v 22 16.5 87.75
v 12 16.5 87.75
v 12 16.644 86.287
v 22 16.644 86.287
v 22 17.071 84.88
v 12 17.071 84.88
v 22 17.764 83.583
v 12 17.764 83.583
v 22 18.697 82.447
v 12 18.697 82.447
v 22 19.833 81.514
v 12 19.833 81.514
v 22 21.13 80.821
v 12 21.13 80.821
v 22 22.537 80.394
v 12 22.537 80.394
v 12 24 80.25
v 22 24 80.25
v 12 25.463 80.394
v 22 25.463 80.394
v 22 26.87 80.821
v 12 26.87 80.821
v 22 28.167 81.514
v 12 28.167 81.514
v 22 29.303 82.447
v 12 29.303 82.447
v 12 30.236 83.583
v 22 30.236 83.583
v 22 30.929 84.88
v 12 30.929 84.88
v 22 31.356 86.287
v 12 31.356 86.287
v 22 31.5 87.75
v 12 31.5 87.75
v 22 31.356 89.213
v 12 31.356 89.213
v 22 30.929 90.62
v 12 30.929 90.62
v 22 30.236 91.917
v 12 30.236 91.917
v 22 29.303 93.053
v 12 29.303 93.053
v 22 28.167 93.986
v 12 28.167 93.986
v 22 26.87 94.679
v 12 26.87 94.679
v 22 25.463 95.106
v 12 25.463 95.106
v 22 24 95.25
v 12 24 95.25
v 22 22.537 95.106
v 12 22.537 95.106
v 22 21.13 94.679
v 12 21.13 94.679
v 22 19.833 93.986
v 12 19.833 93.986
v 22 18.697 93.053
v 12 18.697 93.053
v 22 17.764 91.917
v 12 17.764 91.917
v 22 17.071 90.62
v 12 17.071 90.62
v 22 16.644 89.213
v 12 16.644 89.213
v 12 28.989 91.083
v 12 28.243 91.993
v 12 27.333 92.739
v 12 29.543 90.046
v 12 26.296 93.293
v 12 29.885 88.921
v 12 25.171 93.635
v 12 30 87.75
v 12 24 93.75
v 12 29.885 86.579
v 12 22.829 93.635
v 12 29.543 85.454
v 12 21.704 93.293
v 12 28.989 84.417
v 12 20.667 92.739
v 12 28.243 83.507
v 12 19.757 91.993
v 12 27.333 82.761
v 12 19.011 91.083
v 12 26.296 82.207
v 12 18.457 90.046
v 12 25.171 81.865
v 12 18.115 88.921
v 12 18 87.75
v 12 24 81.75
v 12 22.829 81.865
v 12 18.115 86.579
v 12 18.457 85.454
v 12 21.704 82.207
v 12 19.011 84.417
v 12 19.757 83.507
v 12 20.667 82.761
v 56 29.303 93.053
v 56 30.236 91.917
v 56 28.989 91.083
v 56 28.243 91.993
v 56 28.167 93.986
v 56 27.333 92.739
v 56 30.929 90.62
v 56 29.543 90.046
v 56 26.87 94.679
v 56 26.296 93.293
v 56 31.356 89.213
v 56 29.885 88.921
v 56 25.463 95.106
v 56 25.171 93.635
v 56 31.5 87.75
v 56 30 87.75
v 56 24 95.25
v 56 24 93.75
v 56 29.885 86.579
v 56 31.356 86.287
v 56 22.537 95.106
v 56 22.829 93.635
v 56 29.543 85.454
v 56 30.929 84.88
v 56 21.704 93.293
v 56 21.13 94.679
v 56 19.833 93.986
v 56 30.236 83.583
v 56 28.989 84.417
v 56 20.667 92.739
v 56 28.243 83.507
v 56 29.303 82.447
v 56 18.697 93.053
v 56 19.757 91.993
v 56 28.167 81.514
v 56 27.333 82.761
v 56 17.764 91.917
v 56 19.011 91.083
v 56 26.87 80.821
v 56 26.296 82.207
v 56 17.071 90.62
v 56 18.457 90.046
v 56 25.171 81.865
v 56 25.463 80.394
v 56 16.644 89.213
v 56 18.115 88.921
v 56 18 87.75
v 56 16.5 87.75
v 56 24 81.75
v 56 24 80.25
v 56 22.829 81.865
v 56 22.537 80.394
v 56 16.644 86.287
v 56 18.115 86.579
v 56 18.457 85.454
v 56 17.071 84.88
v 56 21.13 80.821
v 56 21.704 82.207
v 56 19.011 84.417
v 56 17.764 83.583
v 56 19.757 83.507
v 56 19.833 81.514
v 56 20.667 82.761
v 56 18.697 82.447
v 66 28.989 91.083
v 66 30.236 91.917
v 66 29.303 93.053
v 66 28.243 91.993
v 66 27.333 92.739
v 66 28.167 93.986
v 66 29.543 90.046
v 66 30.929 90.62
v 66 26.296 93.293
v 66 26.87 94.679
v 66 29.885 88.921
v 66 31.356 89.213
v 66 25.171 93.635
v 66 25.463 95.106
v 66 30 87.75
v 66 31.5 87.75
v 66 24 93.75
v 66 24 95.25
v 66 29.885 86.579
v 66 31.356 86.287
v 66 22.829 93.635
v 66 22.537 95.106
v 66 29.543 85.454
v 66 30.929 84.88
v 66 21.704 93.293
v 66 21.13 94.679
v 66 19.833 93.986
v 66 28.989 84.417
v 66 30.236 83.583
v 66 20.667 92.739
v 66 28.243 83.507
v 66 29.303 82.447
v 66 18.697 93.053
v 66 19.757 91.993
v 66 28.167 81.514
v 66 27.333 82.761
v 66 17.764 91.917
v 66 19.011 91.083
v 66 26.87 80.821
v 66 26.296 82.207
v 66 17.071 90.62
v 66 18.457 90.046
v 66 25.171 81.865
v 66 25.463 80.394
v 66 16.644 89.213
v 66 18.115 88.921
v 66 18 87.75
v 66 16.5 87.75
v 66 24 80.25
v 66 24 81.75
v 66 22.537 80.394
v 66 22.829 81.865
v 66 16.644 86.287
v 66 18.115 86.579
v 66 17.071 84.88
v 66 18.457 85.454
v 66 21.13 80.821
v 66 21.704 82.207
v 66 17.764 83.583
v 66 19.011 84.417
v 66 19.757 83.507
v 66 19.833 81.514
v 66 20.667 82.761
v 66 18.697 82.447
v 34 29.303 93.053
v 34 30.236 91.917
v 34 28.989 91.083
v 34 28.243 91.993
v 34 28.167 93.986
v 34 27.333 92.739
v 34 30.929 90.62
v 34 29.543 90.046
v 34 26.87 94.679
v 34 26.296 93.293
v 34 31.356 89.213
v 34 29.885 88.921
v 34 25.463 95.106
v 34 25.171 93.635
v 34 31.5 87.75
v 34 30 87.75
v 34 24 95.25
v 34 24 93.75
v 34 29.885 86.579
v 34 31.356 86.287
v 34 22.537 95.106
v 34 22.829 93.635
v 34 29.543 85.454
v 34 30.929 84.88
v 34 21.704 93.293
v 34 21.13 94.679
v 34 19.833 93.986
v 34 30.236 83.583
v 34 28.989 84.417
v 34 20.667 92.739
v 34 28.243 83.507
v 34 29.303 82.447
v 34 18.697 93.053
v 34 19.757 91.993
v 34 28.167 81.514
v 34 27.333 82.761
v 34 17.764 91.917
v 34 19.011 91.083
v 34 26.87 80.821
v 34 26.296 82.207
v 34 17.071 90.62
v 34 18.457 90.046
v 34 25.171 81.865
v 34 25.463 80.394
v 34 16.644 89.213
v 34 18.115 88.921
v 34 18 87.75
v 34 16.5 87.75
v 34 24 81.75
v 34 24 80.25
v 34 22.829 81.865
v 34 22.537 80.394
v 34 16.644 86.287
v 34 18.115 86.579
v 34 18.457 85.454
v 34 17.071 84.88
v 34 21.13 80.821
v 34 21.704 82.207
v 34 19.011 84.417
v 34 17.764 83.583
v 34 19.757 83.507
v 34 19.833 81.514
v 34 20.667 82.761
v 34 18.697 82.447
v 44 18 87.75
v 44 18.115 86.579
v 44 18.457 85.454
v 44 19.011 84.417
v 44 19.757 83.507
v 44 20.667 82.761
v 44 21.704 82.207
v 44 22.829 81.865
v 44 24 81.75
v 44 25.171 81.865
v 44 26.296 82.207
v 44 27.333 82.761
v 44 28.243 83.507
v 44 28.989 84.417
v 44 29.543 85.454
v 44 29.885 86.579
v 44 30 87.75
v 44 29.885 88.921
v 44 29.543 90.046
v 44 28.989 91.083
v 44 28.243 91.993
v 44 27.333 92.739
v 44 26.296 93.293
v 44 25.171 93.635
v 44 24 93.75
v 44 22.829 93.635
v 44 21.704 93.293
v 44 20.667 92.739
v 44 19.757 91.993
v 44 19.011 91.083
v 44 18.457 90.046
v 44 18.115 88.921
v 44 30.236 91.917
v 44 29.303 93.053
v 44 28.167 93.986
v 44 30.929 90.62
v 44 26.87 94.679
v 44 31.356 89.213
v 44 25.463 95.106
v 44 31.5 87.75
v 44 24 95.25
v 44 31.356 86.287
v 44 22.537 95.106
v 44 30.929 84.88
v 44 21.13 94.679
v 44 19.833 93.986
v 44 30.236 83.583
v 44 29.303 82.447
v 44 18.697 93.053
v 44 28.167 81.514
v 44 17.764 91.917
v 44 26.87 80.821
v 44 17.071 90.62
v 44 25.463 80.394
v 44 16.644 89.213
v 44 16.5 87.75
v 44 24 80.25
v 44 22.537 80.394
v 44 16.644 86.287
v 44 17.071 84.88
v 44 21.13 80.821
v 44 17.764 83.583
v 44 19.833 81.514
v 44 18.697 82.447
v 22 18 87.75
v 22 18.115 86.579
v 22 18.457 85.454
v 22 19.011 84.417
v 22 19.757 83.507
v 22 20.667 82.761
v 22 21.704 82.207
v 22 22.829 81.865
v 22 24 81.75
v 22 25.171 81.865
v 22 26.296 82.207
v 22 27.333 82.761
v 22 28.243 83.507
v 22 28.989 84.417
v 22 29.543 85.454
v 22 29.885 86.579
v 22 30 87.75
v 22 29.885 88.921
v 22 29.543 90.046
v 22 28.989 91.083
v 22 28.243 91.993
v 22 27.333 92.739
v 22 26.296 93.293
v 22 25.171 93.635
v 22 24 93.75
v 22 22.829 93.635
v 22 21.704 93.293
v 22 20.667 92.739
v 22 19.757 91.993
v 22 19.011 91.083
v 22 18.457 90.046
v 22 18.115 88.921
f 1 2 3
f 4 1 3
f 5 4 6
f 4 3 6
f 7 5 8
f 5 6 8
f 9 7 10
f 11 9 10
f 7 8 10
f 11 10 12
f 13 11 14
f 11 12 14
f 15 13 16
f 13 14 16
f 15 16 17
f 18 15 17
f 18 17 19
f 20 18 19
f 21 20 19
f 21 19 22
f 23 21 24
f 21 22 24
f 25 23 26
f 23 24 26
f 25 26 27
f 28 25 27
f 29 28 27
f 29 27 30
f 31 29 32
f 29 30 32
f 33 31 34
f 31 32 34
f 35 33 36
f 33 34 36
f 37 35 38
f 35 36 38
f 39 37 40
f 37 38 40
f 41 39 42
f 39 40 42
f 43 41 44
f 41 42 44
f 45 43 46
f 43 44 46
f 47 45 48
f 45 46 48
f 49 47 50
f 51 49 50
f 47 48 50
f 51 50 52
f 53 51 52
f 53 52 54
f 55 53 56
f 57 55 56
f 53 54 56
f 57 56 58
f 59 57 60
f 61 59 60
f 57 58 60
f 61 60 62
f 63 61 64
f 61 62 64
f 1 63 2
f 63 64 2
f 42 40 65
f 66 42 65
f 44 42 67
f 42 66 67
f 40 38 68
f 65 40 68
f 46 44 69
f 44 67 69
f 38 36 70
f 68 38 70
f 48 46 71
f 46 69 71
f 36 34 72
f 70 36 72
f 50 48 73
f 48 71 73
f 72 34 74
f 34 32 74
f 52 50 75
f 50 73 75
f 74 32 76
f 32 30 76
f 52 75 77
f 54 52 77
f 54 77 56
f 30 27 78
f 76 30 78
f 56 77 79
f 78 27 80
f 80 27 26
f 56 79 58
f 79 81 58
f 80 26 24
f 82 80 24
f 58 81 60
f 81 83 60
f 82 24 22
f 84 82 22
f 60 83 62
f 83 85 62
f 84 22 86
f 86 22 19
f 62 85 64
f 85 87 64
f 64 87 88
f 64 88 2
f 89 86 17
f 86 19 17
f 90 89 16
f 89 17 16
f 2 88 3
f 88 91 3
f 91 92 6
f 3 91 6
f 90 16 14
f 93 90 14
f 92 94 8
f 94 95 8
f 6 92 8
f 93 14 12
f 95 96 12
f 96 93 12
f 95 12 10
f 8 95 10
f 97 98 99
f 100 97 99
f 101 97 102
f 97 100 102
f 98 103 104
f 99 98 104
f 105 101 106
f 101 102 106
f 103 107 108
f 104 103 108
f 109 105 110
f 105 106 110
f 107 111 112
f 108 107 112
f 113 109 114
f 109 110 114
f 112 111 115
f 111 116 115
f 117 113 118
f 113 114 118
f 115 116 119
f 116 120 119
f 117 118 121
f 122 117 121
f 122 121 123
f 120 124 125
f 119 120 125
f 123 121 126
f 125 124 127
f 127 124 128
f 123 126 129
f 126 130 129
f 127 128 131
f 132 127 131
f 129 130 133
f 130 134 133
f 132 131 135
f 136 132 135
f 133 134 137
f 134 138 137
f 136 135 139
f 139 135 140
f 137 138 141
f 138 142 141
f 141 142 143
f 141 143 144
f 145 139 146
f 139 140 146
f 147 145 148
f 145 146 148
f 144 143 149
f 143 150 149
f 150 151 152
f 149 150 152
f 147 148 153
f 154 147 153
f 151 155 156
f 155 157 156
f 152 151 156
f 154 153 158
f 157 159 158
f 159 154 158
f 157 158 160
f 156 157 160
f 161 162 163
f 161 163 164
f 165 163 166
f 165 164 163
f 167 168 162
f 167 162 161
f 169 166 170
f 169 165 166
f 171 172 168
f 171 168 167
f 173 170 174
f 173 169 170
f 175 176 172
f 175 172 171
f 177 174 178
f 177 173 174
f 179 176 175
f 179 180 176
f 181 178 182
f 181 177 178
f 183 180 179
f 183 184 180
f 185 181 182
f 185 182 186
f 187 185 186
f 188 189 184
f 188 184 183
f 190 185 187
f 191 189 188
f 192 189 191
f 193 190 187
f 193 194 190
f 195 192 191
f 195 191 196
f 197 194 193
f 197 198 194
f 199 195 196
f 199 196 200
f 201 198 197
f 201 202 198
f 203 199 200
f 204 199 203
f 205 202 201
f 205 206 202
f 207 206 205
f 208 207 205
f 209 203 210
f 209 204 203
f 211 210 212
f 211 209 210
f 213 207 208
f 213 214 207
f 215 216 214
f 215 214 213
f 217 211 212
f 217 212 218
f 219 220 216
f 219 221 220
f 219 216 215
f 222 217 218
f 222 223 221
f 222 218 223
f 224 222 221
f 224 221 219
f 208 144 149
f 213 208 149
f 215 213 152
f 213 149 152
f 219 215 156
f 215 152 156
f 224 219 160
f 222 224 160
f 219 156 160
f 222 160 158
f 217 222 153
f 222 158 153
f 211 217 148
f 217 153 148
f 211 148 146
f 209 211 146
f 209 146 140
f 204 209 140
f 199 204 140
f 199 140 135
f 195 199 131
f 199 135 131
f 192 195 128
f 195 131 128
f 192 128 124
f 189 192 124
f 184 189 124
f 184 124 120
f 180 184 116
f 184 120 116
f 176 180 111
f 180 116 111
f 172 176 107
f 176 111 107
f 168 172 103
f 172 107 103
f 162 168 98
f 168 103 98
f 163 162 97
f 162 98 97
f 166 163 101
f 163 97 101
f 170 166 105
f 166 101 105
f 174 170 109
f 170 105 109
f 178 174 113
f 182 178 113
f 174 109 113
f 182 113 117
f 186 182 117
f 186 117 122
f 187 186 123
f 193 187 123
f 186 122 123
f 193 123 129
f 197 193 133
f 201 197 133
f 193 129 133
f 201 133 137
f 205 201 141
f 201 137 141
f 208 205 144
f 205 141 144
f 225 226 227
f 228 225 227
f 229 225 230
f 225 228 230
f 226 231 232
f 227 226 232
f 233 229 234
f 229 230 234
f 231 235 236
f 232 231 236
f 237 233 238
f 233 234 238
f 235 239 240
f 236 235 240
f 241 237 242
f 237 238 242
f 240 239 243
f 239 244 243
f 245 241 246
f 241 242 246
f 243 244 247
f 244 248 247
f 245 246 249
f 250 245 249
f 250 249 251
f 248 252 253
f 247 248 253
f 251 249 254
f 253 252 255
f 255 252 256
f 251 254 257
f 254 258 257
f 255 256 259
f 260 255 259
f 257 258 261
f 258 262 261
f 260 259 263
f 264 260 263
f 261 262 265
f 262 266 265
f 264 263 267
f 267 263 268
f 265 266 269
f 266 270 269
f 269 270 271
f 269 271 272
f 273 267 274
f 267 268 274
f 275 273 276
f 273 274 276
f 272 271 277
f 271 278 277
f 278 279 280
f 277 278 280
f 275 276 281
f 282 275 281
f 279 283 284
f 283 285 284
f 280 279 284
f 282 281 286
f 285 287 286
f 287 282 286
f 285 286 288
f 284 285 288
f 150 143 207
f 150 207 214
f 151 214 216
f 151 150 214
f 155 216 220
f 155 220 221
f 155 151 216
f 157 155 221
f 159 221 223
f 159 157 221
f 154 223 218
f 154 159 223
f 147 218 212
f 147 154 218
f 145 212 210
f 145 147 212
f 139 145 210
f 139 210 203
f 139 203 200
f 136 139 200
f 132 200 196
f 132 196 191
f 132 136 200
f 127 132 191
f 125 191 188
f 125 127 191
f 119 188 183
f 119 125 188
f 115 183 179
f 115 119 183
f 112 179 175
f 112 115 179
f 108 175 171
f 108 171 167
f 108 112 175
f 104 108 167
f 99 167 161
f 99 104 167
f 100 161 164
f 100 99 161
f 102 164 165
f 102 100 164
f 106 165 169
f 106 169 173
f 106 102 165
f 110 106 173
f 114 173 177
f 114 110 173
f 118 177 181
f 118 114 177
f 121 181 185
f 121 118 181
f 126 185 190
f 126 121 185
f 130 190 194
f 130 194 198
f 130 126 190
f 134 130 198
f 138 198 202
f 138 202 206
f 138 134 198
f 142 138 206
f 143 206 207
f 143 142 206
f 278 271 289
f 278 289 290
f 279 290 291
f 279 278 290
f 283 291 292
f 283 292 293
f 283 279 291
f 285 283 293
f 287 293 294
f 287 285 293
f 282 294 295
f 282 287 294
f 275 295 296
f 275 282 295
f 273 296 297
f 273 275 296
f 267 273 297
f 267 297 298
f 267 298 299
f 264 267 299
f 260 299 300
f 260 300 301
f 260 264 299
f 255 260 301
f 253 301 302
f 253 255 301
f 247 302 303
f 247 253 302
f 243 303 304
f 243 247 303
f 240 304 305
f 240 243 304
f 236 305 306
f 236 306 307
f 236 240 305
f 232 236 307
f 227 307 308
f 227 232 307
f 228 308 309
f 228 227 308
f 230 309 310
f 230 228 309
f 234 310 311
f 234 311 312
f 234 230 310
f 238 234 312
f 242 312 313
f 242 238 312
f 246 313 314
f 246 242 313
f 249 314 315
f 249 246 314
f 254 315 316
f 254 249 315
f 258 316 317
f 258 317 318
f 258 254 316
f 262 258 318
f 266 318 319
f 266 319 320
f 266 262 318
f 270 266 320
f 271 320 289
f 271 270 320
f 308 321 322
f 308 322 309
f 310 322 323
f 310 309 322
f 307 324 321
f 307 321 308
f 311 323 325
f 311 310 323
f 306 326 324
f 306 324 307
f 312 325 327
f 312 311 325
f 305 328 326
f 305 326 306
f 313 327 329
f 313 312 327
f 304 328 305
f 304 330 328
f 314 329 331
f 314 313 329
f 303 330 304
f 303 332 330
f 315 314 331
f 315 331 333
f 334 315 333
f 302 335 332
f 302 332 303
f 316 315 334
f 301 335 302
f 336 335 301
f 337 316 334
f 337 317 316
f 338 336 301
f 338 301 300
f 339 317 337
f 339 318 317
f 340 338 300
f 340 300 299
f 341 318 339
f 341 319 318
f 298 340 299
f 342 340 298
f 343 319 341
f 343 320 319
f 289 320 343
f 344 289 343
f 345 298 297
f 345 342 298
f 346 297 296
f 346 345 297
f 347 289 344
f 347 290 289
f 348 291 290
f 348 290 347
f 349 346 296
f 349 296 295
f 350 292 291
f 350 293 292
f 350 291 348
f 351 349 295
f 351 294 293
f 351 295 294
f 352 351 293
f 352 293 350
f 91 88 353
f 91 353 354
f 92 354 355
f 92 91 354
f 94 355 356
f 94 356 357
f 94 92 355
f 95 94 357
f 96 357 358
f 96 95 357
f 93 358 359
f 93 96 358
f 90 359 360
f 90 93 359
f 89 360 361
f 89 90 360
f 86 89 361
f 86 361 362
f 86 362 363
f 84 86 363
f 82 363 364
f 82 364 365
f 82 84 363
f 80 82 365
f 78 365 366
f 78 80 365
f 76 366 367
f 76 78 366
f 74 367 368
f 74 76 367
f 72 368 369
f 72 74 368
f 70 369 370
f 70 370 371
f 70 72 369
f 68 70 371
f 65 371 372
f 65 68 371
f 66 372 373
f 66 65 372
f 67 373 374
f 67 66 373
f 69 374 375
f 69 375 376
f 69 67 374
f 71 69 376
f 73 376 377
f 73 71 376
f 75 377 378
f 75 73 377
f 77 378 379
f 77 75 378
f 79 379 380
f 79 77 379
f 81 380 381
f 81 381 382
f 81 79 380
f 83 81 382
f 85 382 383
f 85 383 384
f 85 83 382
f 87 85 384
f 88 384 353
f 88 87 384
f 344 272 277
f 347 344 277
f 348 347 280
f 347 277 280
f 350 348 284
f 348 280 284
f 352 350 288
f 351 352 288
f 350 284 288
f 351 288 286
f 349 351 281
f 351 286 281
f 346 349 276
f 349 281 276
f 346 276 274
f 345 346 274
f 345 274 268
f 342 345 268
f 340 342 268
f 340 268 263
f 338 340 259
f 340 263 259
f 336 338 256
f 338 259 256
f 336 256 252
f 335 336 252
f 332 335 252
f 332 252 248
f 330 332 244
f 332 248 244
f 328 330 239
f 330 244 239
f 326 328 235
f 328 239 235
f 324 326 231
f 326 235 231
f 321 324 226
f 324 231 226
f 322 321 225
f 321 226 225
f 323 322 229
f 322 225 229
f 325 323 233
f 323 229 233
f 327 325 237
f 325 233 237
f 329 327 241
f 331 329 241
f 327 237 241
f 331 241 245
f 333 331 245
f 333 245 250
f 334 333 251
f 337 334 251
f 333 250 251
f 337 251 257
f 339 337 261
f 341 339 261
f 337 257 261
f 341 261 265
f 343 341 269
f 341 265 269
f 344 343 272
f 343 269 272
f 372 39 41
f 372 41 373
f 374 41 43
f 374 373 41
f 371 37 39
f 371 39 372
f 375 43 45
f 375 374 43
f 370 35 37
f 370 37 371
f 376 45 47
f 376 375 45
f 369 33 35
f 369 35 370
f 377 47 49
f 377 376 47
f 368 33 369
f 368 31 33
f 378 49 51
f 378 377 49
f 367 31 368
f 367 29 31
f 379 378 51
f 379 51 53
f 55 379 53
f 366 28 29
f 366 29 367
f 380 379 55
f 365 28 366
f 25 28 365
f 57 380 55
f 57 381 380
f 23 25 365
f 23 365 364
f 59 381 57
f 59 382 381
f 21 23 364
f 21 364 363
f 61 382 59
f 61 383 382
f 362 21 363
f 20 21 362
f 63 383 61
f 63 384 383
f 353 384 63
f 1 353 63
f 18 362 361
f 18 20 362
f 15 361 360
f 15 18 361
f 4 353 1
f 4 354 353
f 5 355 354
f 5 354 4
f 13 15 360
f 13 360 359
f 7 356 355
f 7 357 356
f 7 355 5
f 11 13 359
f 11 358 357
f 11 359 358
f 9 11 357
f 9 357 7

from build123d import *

# Parameters (mm, degrees)
TUBE001_R     = 7.5
TUBE001_R_2   = 6
TUBE001_DEPTH = 10
TUBE002_R     = 7.5
TUBE002_R_2   = 6
TUBE002_DEPTH = 10
TUBE_R        = 7.5
TUBE_R_2      = 6
TUBE_DEPTH    = 10


with BuildPart() as tube001:
    # Tube001 → Tube001 (new body)
    with BuildSketch(Plane(origin=(56, 24, 87.75), x_dir=(0, -1, 0), z_dir=(1, 0, 0))):
        Circle(TUBE001_R)
        Circle(TUBE001_R_2, mode=Mode.SUBTRACT)
    extrude(amount=TUBE001_DEPTH)


with BuildPart() as tube002:
    # Tube002 → Tube002 (new body)
    with BuildSketch(Plane(origin=(12, 24, 87.75), x_dir=(0, -1, 0), z_dir=(1, 0, 0))):
        Circle(TUBE002_R)
        Circle(TUBE002_R_2, mode=Mode.SUBTRACT)
    extrude(amount=TUBE002_DEPTH)


with BuildPart() as lacecuts:
    # Tube → Tube (new body)
    with BuildSketch(Plane(origin=(34, 24, 87.75), x_dir=(0, -1, 0), z_dir=(1, 0, 0))):
        Circle(TUBE_R)
        Circle(TUBE_R_2, mode=Mode.SUBTRACT)
    extrude(amount=TUBE_DEPTH)

    # Fusion044: union Tube001, Tube002
    add(tube001.part)
    add(tube002.part)


solid = lacecuts.part
